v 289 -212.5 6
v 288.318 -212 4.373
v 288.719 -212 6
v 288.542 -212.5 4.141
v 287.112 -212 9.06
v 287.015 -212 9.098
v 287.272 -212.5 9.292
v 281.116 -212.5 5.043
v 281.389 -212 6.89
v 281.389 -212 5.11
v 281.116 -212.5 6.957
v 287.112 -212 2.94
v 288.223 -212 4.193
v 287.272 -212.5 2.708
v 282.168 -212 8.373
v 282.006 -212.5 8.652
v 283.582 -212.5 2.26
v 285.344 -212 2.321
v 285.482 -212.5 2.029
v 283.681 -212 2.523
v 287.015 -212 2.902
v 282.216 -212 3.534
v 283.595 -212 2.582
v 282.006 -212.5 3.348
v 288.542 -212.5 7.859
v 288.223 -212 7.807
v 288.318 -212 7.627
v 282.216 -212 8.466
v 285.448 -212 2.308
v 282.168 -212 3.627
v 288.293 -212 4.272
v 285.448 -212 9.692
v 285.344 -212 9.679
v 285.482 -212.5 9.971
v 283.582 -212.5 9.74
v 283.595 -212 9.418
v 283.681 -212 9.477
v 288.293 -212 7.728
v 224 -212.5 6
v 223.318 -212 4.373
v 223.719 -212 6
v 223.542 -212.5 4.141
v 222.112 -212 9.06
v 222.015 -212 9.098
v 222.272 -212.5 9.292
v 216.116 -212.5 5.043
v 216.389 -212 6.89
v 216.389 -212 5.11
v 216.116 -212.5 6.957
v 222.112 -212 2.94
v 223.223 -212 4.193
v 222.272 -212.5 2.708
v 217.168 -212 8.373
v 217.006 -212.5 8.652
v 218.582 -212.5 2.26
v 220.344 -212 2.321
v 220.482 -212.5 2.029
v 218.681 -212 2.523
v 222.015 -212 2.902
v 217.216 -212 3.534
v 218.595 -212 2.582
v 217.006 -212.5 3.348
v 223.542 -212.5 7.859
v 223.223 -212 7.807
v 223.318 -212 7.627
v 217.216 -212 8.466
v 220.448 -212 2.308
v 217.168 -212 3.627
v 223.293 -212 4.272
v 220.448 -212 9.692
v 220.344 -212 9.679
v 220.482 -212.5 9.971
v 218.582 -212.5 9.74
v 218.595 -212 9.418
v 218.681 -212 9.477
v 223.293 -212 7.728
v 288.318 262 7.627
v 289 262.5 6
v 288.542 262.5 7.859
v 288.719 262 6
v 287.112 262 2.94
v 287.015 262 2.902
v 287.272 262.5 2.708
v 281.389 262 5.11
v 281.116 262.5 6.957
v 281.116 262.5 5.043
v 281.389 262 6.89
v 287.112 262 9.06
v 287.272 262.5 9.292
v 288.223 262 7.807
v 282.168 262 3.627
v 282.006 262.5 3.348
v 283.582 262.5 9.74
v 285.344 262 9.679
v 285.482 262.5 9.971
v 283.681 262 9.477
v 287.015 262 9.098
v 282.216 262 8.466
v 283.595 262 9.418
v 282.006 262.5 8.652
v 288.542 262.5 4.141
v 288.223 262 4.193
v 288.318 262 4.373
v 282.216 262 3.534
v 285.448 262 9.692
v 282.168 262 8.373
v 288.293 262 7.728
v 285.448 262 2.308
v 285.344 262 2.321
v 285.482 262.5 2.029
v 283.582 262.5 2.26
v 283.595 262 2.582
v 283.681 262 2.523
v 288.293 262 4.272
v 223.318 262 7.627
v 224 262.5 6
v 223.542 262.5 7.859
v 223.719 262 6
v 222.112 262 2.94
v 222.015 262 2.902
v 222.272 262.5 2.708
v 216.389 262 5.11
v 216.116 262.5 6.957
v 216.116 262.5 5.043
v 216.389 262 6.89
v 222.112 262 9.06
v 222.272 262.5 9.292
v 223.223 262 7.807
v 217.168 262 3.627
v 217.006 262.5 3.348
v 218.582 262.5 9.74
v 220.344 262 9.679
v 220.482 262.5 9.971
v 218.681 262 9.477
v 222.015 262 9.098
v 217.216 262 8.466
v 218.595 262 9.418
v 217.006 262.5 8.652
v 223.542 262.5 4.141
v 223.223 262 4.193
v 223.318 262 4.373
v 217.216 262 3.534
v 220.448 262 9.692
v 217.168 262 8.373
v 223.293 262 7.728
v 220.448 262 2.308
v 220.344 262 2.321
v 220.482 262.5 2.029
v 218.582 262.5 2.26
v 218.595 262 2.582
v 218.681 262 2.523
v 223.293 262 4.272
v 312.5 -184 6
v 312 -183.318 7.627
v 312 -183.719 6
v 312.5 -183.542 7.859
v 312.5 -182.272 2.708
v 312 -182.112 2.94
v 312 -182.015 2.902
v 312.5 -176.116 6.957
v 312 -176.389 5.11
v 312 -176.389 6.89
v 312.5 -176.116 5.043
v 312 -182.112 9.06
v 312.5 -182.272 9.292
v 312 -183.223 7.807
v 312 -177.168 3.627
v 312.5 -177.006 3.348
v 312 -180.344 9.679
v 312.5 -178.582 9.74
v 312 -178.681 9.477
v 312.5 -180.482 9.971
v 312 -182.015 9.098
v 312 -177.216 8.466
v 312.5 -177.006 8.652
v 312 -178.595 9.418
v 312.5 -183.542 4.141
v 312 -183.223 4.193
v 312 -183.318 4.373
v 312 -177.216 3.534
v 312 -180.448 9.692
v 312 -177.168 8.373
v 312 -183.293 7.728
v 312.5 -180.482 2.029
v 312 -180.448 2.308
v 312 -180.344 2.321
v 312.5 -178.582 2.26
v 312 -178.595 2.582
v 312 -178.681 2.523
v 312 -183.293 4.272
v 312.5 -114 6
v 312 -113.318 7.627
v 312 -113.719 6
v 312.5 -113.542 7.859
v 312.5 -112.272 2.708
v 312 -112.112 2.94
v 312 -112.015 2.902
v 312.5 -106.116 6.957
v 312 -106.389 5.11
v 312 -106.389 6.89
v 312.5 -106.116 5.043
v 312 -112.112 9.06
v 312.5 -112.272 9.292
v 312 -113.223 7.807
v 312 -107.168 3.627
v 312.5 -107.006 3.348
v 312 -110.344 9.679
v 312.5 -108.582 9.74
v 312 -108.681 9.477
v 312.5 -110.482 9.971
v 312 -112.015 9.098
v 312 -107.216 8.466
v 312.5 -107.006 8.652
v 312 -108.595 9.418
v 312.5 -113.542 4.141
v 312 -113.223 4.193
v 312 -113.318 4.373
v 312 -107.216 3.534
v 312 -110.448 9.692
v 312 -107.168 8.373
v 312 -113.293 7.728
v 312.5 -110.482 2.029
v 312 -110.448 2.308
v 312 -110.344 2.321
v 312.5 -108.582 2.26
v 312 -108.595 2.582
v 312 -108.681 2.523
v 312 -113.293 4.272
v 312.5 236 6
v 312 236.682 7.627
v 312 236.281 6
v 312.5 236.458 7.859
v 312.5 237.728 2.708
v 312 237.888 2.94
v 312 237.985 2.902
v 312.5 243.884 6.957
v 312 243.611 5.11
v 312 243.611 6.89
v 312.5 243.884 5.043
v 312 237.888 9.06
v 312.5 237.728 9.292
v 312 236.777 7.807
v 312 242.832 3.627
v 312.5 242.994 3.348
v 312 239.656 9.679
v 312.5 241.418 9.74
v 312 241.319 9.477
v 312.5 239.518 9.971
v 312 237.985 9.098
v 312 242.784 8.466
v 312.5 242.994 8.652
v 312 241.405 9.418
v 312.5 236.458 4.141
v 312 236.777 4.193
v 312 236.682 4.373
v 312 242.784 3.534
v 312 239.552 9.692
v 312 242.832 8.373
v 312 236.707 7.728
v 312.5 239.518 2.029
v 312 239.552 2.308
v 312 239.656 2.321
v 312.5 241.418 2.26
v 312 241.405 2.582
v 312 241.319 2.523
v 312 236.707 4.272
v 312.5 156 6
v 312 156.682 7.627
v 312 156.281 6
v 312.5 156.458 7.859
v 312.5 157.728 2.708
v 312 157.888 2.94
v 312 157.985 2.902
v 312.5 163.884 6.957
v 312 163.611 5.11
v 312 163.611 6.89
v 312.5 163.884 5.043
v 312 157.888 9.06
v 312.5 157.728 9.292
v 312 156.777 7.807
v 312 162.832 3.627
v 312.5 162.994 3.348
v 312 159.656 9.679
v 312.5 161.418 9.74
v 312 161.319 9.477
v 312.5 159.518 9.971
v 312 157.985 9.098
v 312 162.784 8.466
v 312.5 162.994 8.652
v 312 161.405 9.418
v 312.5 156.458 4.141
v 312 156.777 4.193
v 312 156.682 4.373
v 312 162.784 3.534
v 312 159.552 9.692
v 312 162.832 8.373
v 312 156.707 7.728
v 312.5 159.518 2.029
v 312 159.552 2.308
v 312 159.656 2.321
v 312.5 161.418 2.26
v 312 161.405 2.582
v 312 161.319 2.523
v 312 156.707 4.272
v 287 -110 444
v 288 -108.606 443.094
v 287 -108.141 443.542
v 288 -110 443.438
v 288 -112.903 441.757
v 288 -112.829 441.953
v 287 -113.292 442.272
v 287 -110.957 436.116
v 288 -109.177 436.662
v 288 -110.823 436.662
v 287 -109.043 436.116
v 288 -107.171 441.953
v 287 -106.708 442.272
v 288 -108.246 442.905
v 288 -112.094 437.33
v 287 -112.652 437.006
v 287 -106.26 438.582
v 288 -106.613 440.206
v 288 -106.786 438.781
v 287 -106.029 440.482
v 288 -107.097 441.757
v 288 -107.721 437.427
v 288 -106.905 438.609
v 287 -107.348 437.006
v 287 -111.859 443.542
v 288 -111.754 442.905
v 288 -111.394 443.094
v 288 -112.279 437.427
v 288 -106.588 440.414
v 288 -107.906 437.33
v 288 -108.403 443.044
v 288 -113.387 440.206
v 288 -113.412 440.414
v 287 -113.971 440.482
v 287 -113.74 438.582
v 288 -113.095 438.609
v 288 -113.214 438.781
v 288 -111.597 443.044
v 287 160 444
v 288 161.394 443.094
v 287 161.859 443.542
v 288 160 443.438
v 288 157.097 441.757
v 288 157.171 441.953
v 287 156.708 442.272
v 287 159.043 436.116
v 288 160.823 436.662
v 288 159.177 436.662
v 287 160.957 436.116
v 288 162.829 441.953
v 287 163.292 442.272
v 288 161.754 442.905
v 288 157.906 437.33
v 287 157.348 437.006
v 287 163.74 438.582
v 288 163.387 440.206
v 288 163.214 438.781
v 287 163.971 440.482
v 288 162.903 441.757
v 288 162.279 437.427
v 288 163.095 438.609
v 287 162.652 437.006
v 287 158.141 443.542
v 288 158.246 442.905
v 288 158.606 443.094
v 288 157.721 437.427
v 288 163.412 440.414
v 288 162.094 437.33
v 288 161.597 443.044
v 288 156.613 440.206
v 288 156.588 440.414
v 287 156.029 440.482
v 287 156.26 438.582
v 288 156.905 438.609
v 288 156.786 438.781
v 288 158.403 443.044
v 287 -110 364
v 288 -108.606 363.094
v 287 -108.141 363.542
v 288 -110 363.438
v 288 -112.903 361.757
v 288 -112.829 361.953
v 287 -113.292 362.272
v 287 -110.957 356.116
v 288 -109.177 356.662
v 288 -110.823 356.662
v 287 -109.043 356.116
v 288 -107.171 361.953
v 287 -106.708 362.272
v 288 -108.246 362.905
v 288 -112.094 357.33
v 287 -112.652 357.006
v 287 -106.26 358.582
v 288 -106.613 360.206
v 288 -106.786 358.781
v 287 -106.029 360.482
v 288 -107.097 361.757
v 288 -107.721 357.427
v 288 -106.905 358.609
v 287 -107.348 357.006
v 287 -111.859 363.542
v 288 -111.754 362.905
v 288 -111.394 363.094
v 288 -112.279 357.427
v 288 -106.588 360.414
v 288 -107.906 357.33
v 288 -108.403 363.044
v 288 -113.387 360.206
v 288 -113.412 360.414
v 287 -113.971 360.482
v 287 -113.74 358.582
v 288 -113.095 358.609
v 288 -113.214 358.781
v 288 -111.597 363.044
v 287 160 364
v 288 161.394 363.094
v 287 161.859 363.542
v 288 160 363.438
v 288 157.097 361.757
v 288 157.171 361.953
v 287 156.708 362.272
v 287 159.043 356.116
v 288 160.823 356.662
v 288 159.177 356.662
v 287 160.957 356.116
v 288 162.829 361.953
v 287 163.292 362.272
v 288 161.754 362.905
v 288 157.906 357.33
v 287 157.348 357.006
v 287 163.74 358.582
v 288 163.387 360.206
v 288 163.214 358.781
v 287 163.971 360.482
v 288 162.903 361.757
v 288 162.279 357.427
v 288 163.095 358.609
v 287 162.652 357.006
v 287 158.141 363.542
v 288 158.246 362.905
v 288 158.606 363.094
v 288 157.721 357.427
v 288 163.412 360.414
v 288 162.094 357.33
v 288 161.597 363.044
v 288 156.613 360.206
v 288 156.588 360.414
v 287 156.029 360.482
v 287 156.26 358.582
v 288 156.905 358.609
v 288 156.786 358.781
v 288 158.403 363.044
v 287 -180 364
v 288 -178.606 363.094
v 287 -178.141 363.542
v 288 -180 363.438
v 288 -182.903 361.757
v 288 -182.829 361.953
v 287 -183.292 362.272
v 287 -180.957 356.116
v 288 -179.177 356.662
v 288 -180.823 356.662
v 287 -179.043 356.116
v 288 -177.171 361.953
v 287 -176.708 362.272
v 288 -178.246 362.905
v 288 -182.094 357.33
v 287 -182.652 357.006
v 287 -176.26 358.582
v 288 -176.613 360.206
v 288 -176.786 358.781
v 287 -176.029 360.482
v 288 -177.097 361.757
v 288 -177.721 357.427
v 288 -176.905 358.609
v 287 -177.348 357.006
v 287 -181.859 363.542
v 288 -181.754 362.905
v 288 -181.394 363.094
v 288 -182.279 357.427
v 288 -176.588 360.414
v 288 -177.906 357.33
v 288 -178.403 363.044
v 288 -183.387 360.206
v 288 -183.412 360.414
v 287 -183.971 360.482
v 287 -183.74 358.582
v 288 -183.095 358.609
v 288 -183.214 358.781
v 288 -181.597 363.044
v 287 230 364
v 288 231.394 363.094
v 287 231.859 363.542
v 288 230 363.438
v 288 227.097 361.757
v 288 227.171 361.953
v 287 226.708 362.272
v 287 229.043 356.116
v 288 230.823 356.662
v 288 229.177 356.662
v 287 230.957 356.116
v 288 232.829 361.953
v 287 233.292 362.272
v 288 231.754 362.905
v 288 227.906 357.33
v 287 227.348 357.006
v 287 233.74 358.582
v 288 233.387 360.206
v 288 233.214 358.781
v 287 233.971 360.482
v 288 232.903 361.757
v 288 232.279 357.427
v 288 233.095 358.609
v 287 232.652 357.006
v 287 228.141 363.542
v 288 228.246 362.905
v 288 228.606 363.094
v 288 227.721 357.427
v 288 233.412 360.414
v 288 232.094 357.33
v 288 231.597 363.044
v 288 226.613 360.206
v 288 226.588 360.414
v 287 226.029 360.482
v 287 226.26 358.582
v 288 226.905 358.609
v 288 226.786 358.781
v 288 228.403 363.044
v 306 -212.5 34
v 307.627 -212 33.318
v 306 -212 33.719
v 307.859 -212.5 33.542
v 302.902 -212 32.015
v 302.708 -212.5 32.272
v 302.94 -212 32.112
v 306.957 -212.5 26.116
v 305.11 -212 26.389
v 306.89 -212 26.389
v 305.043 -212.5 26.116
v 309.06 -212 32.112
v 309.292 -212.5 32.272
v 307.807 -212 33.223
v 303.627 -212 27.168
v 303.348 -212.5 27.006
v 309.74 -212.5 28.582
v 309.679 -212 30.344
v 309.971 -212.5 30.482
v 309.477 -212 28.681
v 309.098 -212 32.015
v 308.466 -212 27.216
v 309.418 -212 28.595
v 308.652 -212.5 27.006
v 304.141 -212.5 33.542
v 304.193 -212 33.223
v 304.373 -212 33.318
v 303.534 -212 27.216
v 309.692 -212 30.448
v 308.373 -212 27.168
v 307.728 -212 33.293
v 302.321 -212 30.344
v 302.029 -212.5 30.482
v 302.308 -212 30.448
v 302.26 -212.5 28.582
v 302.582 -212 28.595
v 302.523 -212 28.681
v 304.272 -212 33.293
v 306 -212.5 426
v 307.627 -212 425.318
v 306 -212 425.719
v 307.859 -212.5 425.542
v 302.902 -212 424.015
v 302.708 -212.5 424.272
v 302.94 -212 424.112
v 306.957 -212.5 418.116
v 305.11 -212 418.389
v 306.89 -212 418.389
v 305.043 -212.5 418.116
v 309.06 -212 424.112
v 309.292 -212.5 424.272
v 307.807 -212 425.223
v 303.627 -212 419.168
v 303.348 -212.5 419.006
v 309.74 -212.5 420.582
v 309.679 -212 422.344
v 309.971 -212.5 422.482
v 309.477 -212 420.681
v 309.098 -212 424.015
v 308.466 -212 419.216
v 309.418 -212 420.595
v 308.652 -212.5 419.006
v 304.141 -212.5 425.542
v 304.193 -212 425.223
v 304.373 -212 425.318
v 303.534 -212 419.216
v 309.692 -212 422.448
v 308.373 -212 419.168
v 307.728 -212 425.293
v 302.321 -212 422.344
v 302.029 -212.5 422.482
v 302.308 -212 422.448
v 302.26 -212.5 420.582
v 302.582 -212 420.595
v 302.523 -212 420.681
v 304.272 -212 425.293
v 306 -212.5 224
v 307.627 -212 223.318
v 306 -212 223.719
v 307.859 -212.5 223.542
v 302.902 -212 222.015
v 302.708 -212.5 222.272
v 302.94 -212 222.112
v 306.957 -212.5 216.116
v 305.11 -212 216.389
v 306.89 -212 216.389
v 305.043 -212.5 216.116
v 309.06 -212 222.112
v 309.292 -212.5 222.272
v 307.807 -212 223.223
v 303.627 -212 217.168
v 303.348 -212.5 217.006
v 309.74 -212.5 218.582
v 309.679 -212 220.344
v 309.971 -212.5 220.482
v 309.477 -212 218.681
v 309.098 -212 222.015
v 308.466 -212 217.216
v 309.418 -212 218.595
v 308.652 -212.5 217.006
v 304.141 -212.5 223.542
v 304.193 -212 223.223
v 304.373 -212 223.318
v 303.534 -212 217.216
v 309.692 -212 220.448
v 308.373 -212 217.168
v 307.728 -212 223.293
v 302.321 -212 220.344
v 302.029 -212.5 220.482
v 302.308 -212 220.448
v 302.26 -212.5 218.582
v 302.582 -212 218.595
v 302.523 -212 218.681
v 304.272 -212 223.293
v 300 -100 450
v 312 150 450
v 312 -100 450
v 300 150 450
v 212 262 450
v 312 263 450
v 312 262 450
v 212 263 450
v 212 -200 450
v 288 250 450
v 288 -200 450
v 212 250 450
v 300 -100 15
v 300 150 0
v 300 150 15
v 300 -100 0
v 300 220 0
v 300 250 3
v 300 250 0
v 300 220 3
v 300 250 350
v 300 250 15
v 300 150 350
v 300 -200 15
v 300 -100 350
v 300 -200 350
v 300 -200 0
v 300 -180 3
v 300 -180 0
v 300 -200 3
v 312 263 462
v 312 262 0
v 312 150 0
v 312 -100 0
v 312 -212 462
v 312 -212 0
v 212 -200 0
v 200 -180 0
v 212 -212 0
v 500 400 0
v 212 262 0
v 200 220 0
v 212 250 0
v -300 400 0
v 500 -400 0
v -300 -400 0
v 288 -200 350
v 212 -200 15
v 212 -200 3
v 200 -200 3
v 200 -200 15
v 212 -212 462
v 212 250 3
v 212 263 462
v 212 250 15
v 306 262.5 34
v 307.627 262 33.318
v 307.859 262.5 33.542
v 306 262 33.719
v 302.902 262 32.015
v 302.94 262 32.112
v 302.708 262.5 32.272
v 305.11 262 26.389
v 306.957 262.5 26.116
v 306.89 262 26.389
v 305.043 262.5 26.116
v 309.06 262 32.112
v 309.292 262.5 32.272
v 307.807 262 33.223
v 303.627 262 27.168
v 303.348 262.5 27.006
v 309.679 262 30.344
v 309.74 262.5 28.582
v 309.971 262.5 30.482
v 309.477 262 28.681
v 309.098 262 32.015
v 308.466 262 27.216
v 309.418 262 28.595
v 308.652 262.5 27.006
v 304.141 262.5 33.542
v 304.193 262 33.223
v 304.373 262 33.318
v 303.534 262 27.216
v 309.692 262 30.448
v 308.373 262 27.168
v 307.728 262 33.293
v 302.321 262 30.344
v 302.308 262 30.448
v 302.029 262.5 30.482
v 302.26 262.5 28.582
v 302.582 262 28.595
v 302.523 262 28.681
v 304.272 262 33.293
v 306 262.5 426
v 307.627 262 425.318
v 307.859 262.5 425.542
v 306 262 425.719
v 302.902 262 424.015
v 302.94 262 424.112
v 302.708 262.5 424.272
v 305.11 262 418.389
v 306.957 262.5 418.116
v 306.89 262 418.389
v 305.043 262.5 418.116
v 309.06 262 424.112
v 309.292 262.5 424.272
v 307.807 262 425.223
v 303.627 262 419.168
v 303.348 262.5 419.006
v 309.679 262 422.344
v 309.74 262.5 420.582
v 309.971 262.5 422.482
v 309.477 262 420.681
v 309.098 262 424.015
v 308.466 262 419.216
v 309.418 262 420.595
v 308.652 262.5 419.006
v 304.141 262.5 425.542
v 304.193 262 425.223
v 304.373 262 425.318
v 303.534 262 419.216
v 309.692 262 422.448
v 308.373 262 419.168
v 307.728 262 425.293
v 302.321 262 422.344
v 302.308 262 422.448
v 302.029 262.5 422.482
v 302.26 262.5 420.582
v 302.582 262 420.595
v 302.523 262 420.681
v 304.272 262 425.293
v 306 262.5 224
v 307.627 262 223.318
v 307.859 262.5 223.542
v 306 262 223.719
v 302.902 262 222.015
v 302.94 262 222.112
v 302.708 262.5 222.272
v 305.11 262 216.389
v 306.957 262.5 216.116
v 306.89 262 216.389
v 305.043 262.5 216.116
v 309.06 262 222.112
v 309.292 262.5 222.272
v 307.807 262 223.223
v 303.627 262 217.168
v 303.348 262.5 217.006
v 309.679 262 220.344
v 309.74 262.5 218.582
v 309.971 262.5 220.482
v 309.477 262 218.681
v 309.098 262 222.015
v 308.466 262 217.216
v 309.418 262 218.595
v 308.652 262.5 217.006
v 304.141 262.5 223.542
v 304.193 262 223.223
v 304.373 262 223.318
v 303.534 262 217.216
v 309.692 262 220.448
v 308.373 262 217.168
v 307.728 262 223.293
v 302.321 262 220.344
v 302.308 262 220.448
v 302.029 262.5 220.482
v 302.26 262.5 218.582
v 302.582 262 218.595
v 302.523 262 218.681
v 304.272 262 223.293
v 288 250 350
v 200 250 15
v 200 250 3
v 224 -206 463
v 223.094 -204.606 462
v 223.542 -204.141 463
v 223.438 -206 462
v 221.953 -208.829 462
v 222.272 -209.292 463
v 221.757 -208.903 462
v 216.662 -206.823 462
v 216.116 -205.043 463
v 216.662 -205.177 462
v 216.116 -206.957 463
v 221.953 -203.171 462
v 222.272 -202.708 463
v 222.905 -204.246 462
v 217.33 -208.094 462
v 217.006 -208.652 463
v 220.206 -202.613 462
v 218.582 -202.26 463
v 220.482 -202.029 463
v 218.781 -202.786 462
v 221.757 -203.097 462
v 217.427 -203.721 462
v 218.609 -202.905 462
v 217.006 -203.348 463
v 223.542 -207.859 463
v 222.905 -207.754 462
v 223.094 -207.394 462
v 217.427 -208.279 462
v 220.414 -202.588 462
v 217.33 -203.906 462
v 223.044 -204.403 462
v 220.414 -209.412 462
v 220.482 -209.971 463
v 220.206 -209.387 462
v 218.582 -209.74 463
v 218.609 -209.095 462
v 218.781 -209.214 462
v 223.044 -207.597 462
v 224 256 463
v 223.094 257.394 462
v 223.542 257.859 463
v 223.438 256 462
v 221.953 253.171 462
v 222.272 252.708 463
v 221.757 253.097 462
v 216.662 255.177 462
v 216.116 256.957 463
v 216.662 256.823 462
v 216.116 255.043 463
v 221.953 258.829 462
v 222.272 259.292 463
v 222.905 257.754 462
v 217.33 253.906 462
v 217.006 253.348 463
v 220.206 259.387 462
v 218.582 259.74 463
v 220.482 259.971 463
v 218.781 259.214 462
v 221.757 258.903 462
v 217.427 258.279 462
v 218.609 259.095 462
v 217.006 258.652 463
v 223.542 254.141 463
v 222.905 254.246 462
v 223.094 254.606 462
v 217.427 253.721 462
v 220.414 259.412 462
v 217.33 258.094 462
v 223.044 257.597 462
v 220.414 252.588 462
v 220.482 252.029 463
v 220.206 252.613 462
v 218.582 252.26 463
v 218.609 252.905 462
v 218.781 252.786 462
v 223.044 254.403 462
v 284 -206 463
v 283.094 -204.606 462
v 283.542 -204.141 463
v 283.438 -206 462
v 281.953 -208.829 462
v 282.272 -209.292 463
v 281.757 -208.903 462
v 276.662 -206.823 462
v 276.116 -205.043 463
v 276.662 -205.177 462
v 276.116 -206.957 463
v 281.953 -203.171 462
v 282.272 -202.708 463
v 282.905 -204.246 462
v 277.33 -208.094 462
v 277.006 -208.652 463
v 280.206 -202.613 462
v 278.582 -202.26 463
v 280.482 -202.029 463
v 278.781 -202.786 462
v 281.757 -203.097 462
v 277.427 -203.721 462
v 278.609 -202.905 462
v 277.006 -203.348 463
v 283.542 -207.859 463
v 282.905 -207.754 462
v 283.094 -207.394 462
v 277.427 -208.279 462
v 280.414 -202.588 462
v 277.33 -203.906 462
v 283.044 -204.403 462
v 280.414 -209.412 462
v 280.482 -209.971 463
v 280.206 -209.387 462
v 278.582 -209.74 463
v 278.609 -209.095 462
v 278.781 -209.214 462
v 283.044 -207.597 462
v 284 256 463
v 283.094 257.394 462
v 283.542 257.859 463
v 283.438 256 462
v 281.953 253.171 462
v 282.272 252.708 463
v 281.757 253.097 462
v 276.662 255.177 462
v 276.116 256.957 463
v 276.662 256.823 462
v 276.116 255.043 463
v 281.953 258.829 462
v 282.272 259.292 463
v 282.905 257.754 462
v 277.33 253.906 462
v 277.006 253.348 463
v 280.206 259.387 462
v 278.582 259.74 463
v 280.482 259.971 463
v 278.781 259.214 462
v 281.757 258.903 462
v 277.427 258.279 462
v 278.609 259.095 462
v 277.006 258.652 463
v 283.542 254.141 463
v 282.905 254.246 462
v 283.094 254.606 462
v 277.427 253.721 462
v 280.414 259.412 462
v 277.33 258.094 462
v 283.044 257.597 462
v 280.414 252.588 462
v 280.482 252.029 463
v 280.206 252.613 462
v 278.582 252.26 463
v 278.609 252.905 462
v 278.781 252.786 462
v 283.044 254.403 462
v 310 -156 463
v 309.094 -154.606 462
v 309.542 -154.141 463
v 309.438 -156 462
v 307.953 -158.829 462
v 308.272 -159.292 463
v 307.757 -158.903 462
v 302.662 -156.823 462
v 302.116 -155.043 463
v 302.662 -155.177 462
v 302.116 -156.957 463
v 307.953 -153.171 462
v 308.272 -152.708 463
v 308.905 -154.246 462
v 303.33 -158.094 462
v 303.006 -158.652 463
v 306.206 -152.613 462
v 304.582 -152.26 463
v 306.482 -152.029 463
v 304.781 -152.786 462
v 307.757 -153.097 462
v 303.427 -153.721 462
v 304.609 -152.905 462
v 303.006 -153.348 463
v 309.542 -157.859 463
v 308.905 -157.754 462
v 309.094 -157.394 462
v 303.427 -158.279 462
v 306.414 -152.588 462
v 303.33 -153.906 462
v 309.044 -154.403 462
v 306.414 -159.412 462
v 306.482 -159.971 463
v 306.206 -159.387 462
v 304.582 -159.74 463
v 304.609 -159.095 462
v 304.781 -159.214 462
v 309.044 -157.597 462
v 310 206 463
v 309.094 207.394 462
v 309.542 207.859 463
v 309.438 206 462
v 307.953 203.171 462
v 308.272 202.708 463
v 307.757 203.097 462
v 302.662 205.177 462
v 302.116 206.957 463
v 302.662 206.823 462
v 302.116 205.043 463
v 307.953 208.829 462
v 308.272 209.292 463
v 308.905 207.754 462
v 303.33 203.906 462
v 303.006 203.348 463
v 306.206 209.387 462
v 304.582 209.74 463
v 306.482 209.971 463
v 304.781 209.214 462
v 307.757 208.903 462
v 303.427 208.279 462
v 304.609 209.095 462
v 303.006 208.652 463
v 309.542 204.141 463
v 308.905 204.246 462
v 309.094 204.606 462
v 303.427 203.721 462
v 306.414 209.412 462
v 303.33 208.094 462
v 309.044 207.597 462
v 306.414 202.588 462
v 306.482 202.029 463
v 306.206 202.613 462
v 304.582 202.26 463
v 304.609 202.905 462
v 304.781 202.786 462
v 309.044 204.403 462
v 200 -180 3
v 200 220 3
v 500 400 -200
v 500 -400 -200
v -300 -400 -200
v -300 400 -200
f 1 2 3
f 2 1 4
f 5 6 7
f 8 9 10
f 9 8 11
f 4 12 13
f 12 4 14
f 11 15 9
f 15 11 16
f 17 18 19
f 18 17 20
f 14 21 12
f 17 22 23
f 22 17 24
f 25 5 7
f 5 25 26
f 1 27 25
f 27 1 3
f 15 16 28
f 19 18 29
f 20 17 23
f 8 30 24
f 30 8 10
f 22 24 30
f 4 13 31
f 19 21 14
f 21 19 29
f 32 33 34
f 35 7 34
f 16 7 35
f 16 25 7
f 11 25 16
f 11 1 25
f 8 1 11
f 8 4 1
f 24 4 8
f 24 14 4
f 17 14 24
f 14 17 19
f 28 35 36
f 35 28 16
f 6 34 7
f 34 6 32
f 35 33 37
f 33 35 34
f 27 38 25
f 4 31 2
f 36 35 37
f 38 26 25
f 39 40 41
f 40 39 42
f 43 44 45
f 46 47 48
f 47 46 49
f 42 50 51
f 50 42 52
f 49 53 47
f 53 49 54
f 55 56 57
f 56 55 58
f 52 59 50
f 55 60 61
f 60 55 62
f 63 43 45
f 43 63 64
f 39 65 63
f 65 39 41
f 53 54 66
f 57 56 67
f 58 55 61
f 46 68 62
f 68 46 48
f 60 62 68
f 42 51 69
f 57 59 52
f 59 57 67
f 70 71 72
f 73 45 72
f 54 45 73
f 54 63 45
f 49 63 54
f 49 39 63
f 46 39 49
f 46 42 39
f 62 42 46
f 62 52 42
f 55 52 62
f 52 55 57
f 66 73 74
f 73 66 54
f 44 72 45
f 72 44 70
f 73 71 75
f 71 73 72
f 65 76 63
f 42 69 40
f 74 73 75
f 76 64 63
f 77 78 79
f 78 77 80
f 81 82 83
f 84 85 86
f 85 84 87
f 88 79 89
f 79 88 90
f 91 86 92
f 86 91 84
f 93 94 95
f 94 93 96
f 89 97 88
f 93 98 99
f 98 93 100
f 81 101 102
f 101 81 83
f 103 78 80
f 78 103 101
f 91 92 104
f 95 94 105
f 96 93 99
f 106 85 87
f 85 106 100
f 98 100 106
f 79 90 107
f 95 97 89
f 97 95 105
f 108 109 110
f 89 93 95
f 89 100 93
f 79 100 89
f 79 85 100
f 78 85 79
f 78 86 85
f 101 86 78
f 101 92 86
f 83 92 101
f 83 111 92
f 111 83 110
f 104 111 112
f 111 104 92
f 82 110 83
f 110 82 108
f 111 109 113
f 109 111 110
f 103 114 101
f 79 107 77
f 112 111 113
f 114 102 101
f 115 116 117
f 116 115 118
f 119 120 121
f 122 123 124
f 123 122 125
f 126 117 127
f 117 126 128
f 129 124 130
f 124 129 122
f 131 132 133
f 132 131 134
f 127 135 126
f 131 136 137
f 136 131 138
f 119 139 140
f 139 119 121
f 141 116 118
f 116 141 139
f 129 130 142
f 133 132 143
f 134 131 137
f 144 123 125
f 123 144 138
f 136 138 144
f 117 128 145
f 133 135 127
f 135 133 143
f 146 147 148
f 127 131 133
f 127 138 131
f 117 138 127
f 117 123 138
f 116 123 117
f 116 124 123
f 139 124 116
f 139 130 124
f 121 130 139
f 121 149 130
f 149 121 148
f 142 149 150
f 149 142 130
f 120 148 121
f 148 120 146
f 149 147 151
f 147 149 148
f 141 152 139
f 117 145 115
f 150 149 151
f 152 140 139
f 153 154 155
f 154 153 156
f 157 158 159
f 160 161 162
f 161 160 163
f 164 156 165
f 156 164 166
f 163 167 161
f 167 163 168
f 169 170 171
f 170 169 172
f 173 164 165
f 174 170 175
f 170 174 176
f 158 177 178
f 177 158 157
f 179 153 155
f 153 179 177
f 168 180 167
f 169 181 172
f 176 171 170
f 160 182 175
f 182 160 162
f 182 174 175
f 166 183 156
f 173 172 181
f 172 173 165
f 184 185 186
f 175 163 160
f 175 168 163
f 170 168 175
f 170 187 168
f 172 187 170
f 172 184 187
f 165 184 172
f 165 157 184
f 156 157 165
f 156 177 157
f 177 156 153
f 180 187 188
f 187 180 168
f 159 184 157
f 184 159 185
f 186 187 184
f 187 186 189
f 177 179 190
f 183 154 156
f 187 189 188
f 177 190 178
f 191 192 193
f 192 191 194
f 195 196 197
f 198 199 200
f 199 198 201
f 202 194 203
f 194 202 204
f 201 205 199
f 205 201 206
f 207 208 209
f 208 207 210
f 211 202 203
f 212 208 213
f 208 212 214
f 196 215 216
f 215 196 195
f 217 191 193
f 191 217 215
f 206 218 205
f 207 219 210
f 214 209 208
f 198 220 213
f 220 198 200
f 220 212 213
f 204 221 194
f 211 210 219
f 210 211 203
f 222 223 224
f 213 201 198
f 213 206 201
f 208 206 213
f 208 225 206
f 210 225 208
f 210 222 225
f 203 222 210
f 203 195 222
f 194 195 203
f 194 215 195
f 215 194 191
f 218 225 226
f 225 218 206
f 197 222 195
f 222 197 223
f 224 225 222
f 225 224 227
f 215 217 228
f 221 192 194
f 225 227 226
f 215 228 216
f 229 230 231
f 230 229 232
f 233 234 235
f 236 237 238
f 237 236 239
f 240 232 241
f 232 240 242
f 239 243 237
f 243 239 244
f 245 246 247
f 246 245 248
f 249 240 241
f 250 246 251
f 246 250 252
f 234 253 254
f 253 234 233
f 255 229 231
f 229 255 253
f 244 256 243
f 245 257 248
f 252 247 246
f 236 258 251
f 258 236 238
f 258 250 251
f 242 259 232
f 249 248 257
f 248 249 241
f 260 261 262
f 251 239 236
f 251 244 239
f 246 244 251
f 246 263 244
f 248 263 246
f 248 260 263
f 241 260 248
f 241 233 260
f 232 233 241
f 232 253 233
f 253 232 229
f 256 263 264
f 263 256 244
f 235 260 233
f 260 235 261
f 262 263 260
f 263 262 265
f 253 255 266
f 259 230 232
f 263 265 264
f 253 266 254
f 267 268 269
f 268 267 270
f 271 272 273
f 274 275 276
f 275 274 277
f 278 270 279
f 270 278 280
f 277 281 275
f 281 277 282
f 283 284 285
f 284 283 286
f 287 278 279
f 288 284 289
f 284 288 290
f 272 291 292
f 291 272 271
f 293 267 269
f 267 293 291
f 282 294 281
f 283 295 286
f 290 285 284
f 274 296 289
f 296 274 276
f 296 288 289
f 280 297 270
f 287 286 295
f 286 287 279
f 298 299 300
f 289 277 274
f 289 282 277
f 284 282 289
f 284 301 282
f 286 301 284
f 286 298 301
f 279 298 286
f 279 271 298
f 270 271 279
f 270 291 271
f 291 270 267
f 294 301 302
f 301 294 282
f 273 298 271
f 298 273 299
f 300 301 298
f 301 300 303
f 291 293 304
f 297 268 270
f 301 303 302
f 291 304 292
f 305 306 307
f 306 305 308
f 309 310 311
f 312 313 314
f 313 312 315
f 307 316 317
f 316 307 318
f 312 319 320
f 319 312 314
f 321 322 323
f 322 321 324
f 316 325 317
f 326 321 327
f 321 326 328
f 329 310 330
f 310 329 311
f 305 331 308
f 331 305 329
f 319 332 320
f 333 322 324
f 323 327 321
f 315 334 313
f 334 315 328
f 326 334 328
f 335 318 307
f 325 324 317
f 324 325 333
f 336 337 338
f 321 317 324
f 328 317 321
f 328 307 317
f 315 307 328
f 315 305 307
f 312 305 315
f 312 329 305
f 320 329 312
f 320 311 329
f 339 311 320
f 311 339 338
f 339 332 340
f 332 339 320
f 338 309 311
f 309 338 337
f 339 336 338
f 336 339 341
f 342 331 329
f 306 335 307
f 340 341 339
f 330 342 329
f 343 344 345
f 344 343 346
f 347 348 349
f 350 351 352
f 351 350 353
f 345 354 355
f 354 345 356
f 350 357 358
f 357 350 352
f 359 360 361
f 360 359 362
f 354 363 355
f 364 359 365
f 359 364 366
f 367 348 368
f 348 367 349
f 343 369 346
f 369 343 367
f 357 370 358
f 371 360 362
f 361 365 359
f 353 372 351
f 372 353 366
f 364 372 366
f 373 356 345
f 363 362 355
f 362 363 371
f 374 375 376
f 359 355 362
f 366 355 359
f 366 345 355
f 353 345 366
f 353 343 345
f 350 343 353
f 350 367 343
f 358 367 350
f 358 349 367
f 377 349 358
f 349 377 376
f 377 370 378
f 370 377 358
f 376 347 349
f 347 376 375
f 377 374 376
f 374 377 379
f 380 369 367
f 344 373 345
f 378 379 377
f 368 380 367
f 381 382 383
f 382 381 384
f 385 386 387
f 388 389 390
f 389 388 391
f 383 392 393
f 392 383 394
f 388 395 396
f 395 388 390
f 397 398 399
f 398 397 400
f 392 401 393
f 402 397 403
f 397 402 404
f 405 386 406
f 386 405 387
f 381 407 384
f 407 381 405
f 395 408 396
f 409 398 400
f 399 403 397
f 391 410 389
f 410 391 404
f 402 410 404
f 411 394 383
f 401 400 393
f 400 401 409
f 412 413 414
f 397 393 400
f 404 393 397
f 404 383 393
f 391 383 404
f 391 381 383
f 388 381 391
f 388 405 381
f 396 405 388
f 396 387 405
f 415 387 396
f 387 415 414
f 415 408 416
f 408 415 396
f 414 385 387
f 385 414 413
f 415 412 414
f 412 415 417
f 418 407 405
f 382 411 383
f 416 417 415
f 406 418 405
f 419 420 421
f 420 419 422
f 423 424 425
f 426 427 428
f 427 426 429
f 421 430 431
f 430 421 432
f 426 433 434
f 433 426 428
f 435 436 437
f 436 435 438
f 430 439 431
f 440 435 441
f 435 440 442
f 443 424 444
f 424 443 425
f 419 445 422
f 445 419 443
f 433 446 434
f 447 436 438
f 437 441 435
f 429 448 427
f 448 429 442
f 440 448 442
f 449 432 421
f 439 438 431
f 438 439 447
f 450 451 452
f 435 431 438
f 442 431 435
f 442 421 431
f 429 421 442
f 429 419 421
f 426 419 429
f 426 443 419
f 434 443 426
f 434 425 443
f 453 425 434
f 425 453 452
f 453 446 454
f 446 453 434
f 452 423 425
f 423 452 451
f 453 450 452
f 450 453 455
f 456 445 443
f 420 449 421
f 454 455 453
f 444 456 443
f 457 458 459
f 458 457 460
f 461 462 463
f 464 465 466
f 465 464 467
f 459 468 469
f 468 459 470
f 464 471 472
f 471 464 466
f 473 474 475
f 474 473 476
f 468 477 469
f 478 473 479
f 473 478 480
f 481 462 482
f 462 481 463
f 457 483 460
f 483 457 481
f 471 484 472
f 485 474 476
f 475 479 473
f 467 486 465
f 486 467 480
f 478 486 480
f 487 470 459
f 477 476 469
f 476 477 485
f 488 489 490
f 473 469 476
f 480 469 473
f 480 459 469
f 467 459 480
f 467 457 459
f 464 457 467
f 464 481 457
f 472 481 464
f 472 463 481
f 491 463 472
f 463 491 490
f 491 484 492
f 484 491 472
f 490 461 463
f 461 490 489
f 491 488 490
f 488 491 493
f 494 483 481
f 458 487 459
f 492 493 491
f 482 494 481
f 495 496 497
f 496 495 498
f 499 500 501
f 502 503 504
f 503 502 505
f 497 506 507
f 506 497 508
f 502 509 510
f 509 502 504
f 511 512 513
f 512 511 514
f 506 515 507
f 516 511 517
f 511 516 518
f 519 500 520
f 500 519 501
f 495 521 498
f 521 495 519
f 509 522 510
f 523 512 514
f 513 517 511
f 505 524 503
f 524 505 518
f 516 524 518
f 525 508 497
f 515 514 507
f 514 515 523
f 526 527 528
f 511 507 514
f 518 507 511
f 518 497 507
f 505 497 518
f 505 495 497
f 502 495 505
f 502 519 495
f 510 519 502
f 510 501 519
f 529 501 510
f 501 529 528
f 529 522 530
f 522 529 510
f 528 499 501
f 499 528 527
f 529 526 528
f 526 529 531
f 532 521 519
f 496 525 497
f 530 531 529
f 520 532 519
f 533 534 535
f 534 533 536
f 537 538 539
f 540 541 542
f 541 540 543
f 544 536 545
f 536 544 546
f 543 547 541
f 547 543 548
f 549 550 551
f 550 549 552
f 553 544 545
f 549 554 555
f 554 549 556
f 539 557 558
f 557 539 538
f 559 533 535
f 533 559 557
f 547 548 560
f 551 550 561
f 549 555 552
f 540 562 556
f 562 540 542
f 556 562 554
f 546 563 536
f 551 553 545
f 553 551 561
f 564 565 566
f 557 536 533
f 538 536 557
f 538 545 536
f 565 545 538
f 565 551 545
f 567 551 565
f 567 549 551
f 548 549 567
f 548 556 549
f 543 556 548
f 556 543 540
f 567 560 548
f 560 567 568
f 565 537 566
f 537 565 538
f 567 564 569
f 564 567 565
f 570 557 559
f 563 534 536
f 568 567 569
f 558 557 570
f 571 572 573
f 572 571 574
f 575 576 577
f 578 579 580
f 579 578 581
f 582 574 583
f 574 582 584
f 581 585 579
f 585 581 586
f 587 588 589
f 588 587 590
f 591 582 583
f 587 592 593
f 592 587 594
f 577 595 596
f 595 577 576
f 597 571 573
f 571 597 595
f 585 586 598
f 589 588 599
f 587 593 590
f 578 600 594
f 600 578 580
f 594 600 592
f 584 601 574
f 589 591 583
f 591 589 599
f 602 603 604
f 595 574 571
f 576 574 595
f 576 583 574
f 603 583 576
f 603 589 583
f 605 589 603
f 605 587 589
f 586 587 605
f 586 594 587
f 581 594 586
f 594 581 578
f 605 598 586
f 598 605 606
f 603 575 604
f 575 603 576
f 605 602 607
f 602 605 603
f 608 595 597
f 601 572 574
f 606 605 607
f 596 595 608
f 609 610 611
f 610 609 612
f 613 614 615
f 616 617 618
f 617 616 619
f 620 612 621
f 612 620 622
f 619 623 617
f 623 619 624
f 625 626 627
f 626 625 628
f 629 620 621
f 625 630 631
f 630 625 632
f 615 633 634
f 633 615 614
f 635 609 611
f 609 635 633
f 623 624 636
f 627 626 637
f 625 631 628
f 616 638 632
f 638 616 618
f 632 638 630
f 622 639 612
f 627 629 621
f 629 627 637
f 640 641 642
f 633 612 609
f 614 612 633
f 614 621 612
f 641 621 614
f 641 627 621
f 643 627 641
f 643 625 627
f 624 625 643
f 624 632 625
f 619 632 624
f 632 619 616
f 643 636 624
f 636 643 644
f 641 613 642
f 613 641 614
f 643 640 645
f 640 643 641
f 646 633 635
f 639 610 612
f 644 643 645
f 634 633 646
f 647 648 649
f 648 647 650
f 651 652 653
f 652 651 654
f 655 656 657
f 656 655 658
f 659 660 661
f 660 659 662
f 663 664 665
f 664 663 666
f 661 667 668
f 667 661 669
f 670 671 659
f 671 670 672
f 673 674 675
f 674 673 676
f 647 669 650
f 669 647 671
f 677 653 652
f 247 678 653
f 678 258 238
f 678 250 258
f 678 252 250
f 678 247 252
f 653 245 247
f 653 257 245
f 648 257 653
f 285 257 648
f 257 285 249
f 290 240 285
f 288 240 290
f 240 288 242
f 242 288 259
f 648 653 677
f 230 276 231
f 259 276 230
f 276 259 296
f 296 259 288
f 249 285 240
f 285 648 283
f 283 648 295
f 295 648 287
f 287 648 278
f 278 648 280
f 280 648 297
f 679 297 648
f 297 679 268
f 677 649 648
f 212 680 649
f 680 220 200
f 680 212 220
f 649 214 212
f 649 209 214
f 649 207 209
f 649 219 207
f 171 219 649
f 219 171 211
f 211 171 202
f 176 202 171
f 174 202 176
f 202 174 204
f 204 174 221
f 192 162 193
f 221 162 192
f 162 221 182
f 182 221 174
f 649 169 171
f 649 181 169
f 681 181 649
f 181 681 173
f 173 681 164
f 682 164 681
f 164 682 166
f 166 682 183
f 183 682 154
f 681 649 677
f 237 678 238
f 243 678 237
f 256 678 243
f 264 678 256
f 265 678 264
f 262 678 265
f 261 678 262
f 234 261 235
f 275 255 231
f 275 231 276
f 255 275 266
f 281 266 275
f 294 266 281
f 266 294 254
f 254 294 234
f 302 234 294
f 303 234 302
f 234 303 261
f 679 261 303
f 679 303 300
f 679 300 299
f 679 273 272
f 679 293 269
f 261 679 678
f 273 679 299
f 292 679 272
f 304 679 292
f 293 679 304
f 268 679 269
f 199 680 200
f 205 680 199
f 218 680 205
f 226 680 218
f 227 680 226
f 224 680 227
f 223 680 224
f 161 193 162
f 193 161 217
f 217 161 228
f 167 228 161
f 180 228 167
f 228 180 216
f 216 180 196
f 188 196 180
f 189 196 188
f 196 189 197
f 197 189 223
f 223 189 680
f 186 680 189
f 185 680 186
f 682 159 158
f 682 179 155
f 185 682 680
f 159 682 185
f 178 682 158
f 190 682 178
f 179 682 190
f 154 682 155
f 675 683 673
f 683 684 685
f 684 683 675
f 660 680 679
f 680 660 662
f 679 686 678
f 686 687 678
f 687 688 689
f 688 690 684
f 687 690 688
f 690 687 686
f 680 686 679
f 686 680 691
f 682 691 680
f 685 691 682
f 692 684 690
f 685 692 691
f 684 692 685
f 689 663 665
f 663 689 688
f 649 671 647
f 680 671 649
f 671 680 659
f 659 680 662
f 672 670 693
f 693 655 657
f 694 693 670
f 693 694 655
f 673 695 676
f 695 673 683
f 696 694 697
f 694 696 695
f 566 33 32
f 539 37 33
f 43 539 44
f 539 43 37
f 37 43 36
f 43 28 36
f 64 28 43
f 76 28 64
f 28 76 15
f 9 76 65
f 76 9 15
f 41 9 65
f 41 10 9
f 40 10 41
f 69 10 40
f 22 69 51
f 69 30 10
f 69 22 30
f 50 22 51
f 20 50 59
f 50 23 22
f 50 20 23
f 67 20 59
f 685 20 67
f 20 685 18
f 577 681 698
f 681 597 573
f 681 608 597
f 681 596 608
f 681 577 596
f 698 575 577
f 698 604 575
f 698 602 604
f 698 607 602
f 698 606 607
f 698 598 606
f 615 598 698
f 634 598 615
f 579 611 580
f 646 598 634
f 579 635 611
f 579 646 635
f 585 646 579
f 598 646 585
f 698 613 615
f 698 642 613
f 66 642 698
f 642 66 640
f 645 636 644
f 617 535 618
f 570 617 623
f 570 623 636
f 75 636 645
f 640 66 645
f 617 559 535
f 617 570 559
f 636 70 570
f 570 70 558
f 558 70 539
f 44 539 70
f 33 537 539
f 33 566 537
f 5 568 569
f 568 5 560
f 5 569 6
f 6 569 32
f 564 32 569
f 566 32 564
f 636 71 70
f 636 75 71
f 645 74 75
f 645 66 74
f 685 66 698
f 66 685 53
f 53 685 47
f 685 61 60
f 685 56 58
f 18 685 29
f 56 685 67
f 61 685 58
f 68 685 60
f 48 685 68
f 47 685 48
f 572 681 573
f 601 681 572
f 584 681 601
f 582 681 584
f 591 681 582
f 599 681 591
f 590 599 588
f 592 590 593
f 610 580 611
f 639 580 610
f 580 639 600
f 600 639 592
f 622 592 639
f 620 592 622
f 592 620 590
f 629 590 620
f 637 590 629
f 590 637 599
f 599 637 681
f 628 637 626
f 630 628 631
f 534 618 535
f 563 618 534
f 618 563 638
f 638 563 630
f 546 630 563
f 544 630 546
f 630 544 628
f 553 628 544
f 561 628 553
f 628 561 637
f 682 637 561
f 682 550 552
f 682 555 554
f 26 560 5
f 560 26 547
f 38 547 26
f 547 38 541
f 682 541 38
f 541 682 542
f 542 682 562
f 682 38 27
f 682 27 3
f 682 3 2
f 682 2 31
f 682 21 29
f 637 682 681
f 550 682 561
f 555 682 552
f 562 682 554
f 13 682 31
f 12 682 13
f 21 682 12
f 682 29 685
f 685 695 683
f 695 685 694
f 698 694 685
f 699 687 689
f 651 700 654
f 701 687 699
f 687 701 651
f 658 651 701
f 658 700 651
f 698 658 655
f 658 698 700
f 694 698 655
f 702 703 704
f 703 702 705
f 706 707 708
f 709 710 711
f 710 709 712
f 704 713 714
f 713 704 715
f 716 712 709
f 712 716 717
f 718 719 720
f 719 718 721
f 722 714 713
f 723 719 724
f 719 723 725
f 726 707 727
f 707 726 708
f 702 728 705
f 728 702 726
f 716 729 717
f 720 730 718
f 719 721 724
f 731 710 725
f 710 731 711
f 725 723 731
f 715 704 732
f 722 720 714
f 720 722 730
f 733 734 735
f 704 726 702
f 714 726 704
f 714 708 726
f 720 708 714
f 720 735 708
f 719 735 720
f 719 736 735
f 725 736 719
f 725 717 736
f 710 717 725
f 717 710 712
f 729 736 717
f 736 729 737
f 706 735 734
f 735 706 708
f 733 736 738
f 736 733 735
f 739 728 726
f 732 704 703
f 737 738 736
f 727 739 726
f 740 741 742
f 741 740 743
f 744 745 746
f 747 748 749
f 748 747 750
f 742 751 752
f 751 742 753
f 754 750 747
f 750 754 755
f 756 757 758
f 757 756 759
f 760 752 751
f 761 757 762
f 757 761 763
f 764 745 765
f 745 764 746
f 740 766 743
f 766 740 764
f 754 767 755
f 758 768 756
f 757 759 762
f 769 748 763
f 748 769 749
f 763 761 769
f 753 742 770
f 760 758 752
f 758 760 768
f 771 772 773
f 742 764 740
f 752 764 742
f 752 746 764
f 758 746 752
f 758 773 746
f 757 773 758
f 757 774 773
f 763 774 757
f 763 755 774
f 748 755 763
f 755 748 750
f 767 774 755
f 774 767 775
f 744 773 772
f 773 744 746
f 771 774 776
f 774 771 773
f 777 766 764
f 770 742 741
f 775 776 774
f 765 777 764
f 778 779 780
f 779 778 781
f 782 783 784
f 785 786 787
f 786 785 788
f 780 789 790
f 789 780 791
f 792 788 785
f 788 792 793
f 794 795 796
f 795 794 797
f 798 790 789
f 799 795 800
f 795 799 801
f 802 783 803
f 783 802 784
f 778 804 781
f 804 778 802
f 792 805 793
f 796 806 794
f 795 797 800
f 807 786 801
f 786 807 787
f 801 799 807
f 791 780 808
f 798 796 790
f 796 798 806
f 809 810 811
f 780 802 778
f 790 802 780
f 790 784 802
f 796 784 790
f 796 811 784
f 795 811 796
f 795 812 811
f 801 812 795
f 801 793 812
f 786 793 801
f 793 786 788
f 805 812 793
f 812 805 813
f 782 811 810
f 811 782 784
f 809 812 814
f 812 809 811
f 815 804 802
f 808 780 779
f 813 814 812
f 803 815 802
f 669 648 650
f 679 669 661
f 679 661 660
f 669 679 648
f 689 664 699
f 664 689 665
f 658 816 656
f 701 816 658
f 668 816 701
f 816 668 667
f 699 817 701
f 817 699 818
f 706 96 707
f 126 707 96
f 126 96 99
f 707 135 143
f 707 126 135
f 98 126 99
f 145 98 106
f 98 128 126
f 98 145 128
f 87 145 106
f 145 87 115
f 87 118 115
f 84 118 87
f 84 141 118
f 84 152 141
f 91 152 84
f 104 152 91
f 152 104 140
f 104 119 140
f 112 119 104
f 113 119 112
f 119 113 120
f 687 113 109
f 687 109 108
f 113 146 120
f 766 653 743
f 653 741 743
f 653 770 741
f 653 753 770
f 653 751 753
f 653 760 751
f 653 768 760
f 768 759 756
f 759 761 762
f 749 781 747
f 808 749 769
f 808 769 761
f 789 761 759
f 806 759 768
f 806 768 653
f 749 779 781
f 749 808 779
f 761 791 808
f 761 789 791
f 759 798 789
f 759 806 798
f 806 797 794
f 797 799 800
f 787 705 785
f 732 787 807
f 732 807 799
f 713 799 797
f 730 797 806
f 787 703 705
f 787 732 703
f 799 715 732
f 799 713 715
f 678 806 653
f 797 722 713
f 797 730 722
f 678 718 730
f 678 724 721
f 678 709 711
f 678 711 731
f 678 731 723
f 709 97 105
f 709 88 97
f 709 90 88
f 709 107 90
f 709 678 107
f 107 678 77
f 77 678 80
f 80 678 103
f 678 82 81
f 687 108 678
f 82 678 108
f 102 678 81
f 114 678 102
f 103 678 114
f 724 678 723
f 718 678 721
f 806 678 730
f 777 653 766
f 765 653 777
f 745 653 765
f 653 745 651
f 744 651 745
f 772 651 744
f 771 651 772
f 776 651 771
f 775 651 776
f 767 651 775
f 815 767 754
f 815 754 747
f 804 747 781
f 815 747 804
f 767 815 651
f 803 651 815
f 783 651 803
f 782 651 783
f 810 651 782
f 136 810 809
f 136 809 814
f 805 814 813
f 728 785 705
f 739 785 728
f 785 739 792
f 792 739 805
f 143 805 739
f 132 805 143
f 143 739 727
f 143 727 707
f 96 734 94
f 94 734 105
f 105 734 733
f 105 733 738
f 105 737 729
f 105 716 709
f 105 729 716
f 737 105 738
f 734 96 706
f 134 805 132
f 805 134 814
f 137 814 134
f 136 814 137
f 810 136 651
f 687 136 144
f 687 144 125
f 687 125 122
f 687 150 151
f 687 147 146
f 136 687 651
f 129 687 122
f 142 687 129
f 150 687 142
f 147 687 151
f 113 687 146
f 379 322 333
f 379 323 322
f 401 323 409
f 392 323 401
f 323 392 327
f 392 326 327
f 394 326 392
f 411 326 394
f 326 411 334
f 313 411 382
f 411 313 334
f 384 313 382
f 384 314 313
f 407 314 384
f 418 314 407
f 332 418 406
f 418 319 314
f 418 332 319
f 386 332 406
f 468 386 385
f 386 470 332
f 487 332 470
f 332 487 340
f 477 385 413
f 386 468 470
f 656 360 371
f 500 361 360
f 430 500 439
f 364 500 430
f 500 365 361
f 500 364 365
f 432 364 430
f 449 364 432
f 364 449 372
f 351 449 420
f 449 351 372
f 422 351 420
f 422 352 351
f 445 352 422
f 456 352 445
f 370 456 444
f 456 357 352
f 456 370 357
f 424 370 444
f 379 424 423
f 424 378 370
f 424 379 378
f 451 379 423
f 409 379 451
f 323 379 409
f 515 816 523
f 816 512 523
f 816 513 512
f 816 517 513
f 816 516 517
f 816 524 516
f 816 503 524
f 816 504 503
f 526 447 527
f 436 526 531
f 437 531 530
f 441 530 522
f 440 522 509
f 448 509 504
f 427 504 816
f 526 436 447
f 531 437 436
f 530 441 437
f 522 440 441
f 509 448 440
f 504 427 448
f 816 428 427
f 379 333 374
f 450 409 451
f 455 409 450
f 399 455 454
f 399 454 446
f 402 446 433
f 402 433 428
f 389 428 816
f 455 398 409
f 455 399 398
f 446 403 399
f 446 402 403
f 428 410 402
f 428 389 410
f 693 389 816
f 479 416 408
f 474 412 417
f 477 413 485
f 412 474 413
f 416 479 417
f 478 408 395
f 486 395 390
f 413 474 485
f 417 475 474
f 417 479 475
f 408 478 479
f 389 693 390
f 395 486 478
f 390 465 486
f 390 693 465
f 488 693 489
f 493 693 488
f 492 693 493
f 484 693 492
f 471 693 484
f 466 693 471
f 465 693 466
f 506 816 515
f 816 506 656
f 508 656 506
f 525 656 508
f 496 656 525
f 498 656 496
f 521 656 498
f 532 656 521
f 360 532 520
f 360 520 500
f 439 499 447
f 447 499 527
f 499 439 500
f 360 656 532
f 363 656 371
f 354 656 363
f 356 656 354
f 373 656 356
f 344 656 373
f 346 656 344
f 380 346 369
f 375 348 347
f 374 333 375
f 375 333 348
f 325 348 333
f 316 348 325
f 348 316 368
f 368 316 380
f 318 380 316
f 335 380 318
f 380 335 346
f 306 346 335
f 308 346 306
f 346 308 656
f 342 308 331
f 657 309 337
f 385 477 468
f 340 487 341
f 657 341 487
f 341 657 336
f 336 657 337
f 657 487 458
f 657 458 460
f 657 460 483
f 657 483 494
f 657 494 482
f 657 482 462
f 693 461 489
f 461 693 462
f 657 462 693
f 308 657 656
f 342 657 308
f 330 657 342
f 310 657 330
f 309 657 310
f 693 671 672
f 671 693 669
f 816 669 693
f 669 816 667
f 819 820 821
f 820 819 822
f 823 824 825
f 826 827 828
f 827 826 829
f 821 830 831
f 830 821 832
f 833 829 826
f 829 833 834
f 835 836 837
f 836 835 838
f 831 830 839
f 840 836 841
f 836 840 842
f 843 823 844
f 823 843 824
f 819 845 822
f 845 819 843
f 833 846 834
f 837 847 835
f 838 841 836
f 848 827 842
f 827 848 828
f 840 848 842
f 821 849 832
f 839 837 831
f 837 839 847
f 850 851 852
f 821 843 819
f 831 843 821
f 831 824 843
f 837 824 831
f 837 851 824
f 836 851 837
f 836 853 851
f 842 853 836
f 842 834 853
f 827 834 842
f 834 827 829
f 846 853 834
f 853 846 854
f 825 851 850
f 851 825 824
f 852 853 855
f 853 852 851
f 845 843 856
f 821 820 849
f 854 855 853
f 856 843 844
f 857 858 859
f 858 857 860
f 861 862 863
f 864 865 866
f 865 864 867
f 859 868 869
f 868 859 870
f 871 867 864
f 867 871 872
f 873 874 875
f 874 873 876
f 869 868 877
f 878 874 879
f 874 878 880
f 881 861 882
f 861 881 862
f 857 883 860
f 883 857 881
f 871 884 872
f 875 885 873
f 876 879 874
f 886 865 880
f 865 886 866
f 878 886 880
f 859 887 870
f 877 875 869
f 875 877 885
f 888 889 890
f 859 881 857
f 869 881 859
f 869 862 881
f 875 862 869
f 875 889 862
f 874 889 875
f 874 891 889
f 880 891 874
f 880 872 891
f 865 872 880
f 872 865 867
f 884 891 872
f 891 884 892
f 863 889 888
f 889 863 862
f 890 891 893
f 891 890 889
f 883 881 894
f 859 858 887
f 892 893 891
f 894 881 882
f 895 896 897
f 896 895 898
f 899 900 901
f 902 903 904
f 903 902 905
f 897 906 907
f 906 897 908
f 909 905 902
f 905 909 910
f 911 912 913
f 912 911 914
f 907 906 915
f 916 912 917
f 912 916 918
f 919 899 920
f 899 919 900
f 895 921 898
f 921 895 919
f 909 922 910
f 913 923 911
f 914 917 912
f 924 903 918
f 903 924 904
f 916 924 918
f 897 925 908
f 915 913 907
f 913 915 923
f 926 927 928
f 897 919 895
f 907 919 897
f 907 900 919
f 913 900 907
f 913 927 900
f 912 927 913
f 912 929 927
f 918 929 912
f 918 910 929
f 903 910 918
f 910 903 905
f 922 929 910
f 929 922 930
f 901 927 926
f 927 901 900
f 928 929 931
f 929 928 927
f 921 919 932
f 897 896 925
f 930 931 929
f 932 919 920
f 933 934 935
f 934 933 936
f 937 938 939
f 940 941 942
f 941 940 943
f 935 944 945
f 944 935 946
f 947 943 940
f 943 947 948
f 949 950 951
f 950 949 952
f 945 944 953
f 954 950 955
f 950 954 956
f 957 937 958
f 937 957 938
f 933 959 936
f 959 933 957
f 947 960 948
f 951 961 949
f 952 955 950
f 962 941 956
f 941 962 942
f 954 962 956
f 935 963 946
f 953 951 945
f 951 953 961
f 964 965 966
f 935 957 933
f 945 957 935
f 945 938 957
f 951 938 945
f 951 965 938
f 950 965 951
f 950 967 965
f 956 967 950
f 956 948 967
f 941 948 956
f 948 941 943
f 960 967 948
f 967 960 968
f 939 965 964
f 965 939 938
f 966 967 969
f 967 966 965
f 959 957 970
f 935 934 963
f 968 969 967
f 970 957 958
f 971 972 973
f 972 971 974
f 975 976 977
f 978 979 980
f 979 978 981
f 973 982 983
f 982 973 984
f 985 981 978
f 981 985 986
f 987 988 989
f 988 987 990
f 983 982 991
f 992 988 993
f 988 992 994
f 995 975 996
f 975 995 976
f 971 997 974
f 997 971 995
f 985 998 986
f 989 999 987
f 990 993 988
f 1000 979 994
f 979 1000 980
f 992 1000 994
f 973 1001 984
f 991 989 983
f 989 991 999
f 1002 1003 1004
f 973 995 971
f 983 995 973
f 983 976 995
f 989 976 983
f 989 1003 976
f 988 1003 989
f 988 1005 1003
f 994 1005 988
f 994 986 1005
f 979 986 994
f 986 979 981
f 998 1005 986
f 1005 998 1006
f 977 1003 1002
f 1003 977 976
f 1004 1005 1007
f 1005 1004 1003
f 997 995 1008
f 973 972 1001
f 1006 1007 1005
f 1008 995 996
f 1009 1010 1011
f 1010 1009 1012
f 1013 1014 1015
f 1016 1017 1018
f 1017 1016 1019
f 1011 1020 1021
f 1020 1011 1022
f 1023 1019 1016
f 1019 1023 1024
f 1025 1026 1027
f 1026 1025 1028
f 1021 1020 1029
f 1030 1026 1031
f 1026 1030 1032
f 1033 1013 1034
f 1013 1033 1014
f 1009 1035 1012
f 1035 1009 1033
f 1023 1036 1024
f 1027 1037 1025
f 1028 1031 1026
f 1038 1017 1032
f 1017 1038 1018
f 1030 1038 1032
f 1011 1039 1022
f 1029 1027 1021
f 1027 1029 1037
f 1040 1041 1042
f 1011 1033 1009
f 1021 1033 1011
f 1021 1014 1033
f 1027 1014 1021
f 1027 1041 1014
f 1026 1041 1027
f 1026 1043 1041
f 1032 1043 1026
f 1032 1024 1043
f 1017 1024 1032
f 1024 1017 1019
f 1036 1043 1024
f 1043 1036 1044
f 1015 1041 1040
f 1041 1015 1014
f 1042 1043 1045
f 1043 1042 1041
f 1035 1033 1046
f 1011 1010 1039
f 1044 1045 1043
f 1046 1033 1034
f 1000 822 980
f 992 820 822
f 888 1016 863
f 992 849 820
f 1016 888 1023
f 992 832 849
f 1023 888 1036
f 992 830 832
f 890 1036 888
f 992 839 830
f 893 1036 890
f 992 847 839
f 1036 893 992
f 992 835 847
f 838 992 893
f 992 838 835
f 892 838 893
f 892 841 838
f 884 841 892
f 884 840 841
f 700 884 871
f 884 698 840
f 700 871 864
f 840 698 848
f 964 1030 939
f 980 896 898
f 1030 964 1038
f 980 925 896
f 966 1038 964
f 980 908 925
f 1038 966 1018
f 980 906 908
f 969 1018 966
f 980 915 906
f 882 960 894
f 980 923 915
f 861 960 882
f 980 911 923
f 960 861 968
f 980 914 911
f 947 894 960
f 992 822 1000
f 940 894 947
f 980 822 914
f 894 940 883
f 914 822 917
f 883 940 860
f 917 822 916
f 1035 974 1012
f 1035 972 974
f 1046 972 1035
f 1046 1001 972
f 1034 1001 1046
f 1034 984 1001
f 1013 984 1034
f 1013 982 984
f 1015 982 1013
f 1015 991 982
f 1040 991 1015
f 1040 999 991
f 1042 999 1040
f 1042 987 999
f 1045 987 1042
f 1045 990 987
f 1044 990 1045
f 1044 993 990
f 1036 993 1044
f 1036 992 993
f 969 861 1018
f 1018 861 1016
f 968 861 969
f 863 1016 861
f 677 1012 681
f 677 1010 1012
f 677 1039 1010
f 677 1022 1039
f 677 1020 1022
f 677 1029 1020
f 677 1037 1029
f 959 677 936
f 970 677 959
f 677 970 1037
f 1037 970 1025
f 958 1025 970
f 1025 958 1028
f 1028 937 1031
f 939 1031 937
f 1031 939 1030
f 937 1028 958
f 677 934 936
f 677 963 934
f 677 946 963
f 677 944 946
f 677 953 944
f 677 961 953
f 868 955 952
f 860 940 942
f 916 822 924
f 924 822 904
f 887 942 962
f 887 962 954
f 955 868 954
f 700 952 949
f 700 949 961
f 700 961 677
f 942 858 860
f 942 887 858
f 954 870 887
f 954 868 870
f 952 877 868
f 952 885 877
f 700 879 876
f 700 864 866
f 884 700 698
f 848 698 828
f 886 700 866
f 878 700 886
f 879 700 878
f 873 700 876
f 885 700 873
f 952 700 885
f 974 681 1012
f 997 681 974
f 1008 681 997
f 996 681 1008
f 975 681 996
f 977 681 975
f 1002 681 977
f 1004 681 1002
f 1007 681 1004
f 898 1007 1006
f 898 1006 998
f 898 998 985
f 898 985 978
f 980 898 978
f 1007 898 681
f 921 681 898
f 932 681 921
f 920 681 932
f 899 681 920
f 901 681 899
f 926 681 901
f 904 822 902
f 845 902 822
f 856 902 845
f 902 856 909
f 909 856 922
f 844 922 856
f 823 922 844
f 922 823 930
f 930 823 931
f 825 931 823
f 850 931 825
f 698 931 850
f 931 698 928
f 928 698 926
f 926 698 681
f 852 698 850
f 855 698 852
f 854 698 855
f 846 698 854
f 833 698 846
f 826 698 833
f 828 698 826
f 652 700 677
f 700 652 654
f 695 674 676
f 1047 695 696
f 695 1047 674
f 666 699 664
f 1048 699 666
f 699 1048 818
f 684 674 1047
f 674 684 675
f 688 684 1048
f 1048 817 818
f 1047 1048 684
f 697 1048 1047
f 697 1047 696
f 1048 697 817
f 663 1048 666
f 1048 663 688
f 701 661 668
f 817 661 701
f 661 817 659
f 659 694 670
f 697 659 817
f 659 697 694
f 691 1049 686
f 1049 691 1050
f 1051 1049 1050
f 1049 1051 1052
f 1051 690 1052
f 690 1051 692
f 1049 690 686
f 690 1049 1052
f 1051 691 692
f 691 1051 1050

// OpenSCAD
module pl(x=100,y=100,z=12){
	cube([x,y,z]);
}
module screw(depth=20){
	color([1,1,0]){
		cylinder(r1=4,r2=3.5/2,h=4);
		cylinder(r1=3.5/2,r2=3.5/2,h=depth-2);
		translate([0,0,depth-2])cylinder(r1=3.5/2,r2=0,h=2);
		
	}
	
}
module p3bscorner(){
translate([30,-12.5,6])rotate([-90,0,0])screw();
translate([422,-12.5,6])rotate([-90,0,0])screw();
translate([220,-12.5,6])rotate([-90,0,0])screw();
color([0.5,0.5,0.5,0.8])pl(x=450);
color([0.5,0.5,0.6,0.8])rotate([90,0,0])pl(x=450);
}
module p3bsgantry(){
translate([440,-110,25])mirror([0,0,1])screw();
translate([440,110+50,25])mirror([0,0,1])screw();
translate([360,-110,25])mirror([0,0,1])screw();
translate([360,110+50,25])mirror([0,0,1])screw();
translate([360,-180,25])mirror([0,0,1])screw();
translate([360,180+50,25])mirror([0,0,1])screw();
color([0.5,0.5,0.6,0.9])translate([450,-200,12])rotate([0,0,90])pl(x=450);
translate([0,-200,0])color([0,0,0,0.3])p3bscorner();
translate([0,250,0])color([0,0,0,0.3])mirror([0,1,0])p3bscorner();
}
module boxframe(top=false){
translate([285,-212.5,6])rotate([-90,0,0])screw();
translate([220,-212.5,6])rotate([-90,0,0])screw();
translate([285,262.5,6])rotate([90,0,0])screw();
translate([220,262.5,6])rotate([90,0,0])screw();
translate([312.5,-180,6])rotate([90,0,-90])screw();
translate([312.5,-110,6])rotate([90,0,-90])screw();
translate([312.5,240,6])rotate([90,0,-90])screw();
translate([312.5,160,6])rotate([90,0,-90])screw();

translate([300,-180,0])rotate([0,0,90])color([1,0,0,0.35])pl(x=400,z=3);
translate([300,-200,3])rotate([0,0,90])color([0,0,1,0.55])pl(x=450);
translate([312,0])rotate([0,-90,0])color([0,0,0,0.4])p3bsgantry();
if(top){
translate([220,-206,463])mirror([0,0,1])screw();
translate([220,256,463])mirror([0,0,1])screw();
translate([280,-206,463])mirror([0,0,1])screw();
translate([280,256,463])mirror([0,0,1])screw();
translate([306,-156,463])mirror([0,0,1])screw();
translate([306,206,463])mirror([0,0,1])screw();
translate([312,-212,450])rotate([0,0,90])color([0,0,1,0.55])pl(x=475);

}
}

color([0,0,0,0.4])boxframe(true);

color([0.8,0.8,0.2,0.35])translate([100,0,-100])cube([800,800,200],true);
